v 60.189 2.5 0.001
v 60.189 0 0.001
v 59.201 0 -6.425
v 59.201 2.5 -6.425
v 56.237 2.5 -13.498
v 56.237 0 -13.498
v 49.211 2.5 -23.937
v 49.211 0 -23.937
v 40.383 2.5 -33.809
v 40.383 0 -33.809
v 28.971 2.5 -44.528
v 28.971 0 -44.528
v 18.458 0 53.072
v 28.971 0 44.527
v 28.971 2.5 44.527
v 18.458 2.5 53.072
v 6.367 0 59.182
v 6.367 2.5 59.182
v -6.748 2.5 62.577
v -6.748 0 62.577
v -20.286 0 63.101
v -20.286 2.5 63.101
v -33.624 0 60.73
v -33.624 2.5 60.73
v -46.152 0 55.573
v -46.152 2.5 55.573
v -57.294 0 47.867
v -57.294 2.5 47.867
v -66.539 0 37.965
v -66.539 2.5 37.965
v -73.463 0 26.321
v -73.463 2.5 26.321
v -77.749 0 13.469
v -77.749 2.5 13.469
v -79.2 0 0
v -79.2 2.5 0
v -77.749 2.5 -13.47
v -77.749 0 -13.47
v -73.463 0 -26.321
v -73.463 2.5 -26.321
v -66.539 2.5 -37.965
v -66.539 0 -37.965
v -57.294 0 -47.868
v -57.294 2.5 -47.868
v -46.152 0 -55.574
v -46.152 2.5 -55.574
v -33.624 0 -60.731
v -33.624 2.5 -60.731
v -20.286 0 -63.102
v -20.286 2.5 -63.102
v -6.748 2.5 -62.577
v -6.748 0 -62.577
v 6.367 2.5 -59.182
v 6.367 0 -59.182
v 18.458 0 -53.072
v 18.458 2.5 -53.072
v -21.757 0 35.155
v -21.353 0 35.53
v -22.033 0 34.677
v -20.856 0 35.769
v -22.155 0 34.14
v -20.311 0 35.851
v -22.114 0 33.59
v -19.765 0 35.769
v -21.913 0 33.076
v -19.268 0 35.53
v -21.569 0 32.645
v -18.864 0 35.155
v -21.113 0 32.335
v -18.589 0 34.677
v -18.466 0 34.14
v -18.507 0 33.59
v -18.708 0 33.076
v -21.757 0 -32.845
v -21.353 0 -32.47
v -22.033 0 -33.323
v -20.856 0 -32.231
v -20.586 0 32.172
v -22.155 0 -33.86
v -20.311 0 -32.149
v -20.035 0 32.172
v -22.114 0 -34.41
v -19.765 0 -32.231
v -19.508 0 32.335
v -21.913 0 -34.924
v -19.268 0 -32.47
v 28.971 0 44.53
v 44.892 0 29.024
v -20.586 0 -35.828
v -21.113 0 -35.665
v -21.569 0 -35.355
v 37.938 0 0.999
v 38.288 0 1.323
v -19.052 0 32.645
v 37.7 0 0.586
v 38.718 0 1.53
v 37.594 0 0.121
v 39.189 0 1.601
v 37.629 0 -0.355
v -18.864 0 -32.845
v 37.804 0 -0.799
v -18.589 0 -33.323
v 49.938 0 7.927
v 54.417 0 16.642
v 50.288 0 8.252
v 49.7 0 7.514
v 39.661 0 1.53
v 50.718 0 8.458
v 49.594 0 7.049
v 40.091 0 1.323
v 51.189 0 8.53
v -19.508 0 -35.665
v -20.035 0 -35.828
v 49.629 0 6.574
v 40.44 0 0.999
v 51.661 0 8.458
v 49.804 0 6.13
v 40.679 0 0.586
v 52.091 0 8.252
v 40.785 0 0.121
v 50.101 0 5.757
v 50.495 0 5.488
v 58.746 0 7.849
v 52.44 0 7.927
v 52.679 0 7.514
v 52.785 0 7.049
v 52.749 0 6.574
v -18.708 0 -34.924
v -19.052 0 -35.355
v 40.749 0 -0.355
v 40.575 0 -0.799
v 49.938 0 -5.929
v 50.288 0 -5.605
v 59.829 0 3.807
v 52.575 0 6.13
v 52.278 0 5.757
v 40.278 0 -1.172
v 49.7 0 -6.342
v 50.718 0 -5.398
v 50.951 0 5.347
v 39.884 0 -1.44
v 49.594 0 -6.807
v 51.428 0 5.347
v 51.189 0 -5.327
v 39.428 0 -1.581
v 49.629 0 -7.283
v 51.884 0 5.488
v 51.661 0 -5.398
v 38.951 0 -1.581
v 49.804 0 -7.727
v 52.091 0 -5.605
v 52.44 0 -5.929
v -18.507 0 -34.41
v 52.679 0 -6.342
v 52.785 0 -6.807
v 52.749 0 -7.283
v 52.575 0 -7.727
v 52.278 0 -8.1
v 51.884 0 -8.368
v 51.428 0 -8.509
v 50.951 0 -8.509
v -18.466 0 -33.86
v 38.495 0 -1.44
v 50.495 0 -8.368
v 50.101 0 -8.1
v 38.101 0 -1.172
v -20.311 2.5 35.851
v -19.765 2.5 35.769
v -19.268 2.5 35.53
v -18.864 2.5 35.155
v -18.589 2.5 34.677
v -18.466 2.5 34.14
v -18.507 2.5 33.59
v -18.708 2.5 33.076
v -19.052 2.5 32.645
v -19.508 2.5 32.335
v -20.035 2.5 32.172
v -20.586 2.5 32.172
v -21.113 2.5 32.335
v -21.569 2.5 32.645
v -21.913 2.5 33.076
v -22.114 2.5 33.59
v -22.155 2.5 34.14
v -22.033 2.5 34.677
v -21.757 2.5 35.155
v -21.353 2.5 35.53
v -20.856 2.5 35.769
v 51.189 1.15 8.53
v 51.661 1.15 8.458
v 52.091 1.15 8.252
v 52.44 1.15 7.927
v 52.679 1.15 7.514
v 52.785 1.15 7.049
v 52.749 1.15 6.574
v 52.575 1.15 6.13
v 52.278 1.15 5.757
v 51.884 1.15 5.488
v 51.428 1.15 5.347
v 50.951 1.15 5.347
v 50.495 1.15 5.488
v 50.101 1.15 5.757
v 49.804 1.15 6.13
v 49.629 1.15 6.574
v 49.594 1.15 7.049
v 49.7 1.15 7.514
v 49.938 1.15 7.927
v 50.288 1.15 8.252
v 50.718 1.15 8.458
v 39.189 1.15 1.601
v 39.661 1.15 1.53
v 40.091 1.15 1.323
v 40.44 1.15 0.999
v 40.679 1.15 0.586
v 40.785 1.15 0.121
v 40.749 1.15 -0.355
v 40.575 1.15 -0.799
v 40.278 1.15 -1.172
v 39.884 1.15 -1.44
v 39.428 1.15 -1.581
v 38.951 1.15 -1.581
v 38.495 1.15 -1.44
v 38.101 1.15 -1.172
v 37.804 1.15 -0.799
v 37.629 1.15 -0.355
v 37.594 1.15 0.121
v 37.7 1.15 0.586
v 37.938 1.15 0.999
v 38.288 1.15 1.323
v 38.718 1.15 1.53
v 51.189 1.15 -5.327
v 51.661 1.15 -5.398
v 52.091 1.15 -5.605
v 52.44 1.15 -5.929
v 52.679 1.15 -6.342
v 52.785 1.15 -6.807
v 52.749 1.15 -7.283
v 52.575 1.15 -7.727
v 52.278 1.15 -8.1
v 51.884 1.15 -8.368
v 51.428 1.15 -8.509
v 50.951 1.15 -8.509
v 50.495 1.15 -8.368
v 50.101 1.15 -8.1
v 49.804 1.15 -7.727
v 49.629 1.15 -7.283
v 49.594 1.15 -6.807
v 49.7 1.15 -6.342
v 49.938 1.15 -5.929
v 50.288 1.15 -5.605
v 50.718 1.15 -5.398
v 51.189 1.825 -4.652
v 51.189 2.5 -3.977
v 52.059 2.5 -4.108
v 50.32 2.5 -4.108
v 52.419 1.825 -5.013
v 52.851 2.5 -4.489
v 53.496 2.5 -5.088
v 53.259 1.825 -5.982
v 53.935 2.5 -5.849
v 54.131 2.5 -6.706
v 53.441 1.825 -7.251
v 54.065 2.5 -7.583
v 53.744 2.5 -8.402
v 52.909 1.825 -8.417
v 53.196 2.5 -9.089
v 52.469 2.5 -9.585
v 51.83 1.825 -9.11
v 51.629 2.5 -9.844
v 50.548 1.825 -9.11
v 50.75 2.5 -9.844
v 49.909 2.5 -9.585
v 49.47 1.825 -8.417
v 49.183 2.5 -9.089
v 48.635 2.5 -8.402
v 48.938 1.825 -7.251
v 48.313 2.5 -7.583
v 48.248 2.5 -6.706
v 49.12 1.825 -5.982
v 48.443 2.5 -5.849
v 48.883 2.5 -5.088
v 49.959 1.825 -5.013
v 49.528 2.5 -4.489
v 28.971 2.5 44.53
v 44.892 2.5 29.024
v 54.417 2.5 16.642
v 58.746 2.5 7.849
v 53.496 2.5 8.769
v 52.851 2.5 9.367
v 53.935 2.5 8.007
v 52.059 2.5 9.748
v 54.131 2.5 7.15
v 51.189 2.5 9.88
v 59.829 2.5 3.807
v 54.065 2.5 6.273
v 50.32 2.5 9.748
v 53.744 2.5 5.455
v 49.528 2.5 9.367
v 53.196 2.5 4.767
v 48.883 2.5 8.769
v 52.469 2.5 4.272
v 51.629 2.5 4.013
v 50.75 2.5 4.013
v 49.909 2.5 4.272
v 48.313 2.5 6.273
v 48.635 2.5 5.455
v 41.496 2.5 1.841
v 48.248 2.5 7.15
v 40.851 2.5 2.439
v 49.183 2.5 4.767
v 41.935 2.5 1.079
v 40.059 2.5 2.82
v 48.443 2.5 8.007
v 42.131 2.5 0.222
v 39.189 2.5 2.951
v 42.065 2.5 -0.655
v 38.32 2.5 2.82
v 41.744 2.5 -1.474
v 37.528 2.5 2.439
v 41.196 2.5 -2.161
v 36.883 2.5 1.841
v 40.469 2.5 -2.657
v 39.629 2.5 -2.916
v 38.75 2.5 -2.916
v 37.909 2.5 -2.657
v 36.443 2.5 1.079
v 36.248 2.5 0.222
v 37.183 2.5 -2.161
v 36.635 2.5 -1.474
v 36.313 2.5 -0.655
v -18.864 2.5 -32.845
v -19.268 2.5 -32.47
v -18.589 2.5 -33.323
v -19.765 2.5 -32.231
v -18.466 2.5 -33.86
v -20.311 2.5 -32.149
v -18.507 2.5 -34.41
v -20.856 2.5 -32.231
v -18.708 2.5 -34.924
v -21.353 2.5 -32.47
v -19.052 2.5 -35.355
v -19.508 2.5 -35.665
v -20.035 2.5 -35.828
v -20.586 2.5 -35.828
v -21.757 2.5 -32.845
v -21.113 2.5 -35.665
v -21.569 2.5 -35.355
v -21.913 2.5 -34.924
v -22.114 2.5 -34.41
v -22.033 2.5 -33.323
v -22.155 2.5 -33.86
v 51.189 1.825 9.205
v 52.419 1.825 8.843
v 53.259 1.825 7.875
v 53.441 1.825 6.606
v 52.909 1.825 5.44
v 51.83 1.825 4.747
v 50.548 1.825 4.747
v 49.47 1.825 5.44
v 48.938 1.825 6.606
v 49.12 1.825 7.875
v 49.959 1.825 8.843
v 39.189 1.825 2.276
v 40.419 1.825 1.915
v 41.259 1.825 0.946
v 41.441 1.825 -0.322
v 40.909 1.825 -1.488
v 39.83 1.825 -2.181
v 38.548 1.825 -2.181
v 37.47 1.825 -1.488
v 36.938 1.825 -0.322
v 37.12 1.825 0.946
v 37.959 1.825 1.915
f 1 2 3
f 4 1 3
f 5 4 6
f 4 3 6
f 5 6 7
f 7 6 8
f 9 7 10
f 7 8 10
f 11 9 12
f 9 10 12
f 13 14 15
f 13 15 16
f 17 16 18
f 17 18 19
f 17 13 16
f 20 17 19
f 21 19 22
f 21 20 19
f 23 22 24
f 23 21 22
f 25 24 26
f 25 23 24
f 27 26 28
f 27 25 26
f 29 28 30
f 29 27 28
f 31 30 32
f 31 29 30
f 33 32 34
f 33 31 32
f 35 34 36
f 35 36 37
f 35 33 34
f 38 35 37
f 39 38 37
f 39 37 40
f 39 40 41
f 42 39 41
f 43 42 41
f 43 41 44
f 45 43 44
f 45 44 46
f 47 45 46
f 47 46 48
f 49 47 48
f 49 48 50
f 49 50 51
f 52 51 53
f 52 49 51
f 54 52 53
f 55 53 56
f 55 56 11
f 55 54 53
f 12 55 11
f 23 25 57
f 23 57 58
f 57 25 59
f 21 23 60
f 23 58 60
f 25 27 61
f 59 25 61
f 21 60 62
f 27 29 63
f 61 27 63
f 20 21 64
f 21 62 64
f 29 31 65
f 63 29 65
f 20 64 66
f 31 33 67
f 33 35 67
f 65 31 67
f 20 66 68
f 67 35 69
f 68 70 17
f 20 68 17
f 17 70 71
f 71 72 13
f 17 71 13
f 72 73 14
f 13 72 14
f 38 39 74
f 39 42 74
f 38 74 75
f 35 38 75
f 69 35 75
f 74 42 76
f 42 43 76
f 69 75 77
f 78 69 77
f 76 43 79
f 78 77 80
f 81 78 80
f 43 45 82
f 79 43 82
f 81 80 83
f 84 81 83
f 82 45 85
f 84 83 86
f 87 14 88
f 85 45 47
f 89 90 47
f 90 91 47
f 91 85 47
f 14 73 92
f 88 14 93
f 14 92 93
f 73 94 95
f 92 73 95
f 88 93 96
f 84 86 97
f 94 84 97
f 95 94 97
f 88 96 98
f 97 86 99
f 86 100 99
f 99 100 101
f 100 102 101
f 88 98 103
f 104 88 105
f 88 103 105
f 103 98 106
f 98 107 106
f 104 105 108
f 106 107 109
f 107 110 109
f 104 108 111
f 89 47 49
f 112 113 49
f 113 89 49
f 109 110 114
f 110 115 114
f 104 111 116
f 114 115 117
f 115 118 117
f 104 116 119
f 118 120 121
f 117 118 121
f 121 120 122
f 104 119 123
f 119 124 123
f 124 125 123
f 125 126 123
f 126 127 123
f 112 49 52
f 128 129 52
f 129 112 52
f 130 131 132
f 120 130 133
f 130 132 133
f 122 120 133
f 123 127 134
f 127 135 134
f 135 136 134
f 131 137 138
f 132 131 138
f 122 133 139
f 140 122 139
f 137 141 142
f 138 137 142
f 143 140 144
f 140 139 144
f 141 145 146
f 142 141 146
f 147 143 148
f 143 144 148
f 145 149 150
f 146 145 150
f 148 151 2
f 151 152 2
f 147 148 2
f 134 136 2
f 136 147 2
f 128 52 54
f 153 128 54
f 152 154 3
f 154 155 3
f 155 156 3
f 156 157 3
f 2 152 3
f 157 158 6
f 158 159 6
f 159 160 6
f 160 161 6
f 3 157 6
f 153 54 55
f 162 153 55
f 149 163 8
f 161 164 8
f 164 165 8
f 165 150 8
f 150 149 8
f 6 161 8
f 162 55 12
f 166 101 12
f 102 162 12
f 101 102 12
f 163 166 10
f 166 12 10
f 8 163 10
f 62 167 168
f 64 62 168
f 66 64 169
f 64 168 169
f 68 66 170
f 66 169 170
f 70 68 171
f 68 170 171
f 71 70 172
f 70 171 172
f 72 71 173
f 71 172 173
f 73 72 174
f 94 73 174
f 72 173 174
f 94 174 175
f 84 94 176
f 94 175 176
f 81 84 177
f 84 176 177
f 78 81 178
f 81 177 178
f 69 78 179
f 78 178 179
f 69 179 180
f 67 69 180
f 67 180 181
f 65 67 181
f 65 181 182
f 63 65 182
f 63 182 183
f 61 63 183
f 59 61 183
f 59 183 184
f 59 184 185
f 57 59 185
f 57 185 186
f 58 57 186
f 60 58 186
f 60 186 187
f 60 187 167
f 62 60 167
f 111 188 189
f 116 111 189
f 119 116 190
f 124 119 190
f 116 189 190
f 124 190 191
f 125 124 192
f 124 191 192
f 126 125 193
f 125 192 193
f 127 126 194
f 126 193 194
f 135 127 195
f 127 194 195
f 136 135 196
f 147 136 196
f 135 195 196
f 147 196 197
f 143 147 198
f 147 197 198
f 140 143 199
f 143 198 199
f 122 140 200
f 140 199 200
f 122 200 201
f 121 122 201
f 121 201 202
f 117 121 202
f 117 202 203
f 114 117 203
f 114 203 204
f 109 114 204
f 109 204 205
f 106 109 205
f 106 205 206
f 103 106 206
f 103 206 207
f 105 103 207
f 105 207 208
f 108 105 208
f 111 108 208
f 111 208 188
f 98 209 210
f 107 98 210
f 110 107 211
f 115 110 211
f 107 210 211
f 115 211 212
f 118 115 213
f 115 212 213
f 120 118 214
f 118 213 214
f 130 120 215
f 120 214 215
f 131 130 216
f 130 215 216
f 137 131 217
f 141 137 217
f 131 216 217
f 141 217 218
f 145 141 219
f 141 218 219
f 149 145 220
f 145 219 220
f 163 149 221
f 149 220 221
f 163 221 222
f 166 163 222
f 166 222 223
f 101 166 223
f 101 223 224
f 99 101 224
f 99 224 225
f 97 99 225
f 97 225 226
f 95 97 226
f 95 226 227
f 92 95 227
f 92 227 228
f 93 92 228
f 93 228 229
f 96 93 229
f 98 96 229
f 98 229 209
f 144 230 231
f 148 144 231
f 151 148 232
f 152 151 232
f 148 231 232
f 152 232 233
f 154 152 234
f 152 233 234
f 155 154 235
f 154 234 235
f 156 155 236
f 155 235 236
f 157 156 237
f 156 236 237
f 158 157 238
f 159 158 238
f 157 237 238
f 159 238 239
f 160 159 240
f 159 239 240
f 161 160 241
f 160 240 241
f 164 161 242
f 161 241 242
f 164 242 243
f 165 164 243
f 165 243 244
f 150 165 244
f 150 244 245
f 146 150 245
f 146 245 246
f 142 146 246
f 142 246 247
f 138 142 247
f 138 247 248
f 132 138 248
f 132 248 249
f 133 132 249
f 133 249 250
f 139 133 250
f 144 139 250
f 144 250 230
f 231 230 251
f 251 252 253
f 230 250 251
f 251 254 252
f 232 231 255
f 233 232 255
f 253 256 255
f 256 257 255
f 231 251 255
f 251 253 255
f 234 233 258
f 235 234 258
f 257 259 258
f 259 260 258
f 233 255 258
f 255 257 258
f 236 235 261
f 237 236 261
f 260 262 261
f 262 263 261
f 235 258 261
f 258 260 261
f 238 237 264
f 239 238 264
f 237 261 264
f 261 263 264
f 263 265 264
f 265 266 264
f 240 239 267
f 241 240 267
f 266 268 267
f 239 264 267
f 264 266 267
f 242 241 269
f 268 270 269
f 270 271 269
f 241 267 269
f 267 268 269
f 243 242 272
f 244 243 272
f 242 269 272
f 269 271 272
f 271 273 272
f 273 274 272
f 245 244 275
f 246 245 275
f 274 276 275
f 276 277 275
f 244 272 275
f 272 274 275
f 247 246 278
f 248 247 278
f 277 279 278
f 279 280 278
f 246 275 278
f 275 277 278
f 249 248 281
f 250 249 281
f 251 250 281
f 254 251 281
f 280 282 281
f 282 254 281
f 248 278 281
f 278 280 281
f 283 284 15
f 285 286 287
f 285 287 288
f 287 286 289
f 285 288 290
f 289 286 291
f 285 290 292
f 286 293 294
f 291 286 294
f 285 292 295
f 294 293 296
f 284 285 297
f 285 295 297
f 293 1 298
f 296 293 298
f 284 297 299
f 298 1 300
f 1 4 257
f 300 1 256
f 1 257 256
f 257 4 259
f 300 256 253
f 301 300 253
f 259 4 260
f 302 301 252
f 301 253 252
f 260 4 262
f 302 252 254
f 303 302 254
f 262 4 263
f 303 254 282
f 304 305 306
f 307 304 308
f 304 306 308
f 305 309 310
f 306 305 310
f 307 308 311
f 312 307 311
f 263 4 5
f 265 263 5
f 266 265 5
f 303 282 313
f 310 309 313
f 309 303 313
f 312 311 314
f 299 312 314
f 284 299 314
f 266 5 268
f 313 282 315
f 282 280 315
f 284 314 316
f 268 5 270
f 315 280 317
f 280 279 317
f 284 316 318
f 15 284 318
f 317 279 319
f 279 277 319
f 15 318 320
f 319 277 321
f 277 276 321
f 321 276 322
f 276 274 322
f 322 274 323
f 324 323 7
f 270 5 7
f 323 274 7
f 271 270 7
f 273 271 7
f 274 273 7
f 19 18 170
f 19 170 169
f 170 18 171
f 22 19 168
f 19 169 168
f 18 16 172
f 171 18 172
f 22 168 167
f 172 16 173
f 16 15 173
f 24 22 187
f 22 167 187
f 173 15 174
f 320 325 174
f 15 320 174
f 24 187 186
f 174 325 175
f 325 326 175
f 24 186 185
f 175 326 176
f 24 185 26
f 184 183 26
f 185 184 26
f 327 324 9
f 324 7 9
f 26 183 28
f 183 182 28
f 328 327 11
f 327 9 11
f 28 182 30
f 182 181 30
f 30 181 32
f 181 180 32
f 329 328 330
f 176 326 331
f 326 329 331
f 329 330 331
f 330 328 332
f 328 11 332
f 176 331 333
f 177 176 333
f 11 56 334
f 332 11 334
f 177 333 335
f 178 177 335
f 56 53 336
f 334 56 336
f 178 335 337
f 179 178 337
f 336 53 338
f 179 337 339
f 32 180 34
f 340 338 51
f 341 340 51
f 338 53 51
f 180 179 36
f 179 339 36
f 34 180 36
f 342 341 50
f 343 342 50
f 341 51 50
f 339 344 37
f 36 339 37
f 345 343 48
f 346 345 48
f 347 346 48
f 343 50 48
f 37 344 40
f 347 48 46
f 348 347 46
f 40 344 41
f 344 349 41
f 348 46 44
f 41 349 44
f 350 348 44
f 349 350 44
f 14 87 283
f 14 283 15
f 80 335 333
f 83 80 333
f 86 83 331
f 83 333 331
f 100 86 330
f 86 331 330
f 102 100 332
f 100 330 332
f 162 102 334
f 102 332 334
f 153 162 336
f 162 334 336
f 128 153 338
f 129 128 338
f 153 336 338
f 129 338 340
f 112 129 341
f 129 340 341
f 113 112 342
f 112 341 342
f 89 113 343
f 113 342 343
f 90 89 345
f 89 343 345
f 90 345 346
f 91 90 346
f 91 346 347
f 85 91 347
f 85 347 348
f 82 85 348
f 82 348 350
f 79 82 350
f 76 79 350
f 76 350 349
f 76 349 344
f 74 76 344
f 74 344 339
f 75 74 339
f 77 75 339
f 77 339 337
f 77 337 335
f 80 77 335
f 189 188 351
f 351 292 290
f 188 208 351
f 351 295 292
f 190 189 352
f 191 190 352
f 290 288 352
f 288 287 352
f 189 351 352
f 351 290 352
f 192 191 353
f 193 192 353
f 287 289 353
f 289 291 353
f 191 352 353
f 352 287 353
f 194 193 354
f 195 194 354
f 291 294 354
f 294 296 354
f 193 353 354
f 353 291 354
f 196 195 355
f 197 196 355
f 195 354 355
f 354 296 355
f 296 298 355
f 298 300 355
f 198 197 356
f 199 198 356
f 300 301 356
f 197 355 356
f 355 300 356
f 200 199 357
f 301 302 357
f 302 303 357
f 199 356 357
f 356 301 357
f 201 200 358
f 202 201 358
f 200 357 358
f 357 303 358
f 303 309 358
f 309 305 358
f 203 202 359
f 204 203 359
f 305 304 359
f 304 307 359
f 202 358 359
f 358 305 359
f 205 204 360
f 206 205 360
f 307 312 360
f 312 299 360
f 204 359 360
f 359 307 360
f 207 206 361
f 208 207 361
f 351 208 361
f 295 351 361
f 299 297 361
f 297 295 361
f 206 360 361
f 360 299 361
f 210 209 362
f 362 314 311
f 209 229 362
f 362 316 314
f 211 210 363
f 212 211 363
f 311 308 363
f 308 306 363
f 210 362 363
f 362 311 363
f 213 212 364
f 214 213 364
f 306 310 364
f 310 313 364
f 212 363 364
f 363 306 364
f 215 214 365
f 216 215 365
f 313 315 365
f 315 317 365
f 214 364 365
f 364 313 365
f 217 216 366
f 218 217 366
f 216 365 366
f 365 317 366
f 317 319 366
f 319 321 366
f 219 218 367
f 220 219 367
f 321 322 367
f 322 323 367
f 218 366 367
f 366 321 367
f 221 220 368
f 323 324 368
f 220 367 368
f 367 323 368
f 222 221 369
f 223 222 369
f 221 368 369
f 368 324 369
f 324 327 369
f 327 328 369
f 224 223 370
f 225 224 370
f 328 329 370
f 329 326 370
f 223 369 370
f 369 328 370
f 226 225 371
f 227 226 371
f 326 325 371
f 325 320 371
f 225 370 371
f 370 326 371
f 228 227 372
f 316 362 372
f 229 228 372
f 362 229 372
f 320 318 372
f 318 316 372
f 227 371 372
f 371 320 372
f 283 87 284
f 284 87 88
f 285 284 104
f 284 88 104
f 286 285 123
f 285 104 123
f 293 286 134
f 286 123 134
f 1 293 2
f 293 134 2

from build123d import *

# Parameters (mm, degrees)
SKIZZE1_R                       = 13
AUFSATZ_LINEAR_AUSTRAGEN1_DEPTH = 2.5
SKIZZE2_R                       = 1.6
SCHNITT_LINEAR_AUSTRAGEN1_DEPTH = 102.387999648
FASE1_SIZE                      = 1.35
SKIZZE3_R                       = 1.85
SCHNITT_LINEAR_AUSTRAGEN2_DEPTH = 102.387999648


with BuildPart() as part:
    # Skizze1 → Aufsatz-Linear austragen1 (new body)
    # profile 1 of 2: a face of its own
    with BuildSketch(Plane(origin=(0, 0, 0), x_dir=(1, 0, 0), z_dir=(0, 1, 0))):
        with BuildLine():
            add(Edge.make_bspline(
                [(60.189363801, -0.001348653), (60.189363801, -17.15173776), (28.970752729, -44.530261837)],
                knots=[0, 0, 0, 1, 1, 1], degree=2))
            Line((28.970752729, -44.530261837), (28.970752729, -44.526849746))
            ThreePointArc((28.970752729, -44.526849746), (-79.200181402, 0.000357393), (28.970752729, 44.527564532))
            add(Edge.make_bspline(
                [(60.189363801, -0.001348653), (60.189363801, 17.149040455), (28.970752729, 44.527564532)],
                knots=[0, 0, 0, 1, 1, 1], degree=2))
        make_face()
        with Locations((47.189363801, -0.001348653)):
            Circle(SKIZZE1_R, mode=Mode.SUBTRACT)
    # profile 2 of 2: a face of its own
    with BuildSketch(Plane(origin=(0, 0, 0), x_dir=(1, 0, 0), z_dir=(0, 1, 0))):
        with Locations((47.189363801, -0.001348653)):
            Circle(SKIZZE1_R)
    extrude(amount=AUFSATZ_LINEAR_AUSTRAGEN1_DEPTH)

    # Skizze2 → Schnitt-Linear austragen1 (cut, through all)
    with BuildSketch(Plane(origin=(0, 2.5, 0), x_dir=(1, 0, 0), z_dir=(0, 1, 0))):
        with Locations(Location((51.189363801, 6.926854578, 0), (0, 0, 270))):
            Circle(SKIZZE2_R)
        with Locations(Location((51.189363801, -6.929551883, 0), (0, 0, 270))):
            Circle(SKIZZE2_R)
        with Locations(Location((39.189363801, -0.001348653, 0), (0, 0, 270))):
            Circle(SKIZZE2_R)
    extrude(amount=-SCHNITT_LINEAR_AUSTRAGEN1_DEPTH, mode=Mode.SUBTRACT)

    # Fase1
    fase1_edges = [part.edges().sort_by_distance(p)[0] for p in [
        (51.189363801, 2.5, -8.526854578),
        (51.189363801, 2.5, 5.329551883),
        (39.189363801, 2.5, -1.598651347),
    ]]
    chamfer(fase1_edges, length=FASE1_SIZE)

    # Skizze3 → Schnitt-Linear austragen2 (cut, through all)
    with BuildSketch(Plane(origin=(0, 2.5, 0), x_dir=(1, 0, 0), z_dir=(0, 1, 0))):
        with Locations(Location((-20.310636199, 33.998651347, 0), (0, 0, 270))):
            Circle(SKIZZE3_R)
        with Locations(Location((-20.310636199, -34.001348653, 0), (0, 0, 270))):
            Circle(SKIZZE3_R)
    extrude(amount=-SCHNITT_LINEAR_AUSTRAGEN2_DEPTH, mode=Mode.SUBTRACT)


solid = part.part
